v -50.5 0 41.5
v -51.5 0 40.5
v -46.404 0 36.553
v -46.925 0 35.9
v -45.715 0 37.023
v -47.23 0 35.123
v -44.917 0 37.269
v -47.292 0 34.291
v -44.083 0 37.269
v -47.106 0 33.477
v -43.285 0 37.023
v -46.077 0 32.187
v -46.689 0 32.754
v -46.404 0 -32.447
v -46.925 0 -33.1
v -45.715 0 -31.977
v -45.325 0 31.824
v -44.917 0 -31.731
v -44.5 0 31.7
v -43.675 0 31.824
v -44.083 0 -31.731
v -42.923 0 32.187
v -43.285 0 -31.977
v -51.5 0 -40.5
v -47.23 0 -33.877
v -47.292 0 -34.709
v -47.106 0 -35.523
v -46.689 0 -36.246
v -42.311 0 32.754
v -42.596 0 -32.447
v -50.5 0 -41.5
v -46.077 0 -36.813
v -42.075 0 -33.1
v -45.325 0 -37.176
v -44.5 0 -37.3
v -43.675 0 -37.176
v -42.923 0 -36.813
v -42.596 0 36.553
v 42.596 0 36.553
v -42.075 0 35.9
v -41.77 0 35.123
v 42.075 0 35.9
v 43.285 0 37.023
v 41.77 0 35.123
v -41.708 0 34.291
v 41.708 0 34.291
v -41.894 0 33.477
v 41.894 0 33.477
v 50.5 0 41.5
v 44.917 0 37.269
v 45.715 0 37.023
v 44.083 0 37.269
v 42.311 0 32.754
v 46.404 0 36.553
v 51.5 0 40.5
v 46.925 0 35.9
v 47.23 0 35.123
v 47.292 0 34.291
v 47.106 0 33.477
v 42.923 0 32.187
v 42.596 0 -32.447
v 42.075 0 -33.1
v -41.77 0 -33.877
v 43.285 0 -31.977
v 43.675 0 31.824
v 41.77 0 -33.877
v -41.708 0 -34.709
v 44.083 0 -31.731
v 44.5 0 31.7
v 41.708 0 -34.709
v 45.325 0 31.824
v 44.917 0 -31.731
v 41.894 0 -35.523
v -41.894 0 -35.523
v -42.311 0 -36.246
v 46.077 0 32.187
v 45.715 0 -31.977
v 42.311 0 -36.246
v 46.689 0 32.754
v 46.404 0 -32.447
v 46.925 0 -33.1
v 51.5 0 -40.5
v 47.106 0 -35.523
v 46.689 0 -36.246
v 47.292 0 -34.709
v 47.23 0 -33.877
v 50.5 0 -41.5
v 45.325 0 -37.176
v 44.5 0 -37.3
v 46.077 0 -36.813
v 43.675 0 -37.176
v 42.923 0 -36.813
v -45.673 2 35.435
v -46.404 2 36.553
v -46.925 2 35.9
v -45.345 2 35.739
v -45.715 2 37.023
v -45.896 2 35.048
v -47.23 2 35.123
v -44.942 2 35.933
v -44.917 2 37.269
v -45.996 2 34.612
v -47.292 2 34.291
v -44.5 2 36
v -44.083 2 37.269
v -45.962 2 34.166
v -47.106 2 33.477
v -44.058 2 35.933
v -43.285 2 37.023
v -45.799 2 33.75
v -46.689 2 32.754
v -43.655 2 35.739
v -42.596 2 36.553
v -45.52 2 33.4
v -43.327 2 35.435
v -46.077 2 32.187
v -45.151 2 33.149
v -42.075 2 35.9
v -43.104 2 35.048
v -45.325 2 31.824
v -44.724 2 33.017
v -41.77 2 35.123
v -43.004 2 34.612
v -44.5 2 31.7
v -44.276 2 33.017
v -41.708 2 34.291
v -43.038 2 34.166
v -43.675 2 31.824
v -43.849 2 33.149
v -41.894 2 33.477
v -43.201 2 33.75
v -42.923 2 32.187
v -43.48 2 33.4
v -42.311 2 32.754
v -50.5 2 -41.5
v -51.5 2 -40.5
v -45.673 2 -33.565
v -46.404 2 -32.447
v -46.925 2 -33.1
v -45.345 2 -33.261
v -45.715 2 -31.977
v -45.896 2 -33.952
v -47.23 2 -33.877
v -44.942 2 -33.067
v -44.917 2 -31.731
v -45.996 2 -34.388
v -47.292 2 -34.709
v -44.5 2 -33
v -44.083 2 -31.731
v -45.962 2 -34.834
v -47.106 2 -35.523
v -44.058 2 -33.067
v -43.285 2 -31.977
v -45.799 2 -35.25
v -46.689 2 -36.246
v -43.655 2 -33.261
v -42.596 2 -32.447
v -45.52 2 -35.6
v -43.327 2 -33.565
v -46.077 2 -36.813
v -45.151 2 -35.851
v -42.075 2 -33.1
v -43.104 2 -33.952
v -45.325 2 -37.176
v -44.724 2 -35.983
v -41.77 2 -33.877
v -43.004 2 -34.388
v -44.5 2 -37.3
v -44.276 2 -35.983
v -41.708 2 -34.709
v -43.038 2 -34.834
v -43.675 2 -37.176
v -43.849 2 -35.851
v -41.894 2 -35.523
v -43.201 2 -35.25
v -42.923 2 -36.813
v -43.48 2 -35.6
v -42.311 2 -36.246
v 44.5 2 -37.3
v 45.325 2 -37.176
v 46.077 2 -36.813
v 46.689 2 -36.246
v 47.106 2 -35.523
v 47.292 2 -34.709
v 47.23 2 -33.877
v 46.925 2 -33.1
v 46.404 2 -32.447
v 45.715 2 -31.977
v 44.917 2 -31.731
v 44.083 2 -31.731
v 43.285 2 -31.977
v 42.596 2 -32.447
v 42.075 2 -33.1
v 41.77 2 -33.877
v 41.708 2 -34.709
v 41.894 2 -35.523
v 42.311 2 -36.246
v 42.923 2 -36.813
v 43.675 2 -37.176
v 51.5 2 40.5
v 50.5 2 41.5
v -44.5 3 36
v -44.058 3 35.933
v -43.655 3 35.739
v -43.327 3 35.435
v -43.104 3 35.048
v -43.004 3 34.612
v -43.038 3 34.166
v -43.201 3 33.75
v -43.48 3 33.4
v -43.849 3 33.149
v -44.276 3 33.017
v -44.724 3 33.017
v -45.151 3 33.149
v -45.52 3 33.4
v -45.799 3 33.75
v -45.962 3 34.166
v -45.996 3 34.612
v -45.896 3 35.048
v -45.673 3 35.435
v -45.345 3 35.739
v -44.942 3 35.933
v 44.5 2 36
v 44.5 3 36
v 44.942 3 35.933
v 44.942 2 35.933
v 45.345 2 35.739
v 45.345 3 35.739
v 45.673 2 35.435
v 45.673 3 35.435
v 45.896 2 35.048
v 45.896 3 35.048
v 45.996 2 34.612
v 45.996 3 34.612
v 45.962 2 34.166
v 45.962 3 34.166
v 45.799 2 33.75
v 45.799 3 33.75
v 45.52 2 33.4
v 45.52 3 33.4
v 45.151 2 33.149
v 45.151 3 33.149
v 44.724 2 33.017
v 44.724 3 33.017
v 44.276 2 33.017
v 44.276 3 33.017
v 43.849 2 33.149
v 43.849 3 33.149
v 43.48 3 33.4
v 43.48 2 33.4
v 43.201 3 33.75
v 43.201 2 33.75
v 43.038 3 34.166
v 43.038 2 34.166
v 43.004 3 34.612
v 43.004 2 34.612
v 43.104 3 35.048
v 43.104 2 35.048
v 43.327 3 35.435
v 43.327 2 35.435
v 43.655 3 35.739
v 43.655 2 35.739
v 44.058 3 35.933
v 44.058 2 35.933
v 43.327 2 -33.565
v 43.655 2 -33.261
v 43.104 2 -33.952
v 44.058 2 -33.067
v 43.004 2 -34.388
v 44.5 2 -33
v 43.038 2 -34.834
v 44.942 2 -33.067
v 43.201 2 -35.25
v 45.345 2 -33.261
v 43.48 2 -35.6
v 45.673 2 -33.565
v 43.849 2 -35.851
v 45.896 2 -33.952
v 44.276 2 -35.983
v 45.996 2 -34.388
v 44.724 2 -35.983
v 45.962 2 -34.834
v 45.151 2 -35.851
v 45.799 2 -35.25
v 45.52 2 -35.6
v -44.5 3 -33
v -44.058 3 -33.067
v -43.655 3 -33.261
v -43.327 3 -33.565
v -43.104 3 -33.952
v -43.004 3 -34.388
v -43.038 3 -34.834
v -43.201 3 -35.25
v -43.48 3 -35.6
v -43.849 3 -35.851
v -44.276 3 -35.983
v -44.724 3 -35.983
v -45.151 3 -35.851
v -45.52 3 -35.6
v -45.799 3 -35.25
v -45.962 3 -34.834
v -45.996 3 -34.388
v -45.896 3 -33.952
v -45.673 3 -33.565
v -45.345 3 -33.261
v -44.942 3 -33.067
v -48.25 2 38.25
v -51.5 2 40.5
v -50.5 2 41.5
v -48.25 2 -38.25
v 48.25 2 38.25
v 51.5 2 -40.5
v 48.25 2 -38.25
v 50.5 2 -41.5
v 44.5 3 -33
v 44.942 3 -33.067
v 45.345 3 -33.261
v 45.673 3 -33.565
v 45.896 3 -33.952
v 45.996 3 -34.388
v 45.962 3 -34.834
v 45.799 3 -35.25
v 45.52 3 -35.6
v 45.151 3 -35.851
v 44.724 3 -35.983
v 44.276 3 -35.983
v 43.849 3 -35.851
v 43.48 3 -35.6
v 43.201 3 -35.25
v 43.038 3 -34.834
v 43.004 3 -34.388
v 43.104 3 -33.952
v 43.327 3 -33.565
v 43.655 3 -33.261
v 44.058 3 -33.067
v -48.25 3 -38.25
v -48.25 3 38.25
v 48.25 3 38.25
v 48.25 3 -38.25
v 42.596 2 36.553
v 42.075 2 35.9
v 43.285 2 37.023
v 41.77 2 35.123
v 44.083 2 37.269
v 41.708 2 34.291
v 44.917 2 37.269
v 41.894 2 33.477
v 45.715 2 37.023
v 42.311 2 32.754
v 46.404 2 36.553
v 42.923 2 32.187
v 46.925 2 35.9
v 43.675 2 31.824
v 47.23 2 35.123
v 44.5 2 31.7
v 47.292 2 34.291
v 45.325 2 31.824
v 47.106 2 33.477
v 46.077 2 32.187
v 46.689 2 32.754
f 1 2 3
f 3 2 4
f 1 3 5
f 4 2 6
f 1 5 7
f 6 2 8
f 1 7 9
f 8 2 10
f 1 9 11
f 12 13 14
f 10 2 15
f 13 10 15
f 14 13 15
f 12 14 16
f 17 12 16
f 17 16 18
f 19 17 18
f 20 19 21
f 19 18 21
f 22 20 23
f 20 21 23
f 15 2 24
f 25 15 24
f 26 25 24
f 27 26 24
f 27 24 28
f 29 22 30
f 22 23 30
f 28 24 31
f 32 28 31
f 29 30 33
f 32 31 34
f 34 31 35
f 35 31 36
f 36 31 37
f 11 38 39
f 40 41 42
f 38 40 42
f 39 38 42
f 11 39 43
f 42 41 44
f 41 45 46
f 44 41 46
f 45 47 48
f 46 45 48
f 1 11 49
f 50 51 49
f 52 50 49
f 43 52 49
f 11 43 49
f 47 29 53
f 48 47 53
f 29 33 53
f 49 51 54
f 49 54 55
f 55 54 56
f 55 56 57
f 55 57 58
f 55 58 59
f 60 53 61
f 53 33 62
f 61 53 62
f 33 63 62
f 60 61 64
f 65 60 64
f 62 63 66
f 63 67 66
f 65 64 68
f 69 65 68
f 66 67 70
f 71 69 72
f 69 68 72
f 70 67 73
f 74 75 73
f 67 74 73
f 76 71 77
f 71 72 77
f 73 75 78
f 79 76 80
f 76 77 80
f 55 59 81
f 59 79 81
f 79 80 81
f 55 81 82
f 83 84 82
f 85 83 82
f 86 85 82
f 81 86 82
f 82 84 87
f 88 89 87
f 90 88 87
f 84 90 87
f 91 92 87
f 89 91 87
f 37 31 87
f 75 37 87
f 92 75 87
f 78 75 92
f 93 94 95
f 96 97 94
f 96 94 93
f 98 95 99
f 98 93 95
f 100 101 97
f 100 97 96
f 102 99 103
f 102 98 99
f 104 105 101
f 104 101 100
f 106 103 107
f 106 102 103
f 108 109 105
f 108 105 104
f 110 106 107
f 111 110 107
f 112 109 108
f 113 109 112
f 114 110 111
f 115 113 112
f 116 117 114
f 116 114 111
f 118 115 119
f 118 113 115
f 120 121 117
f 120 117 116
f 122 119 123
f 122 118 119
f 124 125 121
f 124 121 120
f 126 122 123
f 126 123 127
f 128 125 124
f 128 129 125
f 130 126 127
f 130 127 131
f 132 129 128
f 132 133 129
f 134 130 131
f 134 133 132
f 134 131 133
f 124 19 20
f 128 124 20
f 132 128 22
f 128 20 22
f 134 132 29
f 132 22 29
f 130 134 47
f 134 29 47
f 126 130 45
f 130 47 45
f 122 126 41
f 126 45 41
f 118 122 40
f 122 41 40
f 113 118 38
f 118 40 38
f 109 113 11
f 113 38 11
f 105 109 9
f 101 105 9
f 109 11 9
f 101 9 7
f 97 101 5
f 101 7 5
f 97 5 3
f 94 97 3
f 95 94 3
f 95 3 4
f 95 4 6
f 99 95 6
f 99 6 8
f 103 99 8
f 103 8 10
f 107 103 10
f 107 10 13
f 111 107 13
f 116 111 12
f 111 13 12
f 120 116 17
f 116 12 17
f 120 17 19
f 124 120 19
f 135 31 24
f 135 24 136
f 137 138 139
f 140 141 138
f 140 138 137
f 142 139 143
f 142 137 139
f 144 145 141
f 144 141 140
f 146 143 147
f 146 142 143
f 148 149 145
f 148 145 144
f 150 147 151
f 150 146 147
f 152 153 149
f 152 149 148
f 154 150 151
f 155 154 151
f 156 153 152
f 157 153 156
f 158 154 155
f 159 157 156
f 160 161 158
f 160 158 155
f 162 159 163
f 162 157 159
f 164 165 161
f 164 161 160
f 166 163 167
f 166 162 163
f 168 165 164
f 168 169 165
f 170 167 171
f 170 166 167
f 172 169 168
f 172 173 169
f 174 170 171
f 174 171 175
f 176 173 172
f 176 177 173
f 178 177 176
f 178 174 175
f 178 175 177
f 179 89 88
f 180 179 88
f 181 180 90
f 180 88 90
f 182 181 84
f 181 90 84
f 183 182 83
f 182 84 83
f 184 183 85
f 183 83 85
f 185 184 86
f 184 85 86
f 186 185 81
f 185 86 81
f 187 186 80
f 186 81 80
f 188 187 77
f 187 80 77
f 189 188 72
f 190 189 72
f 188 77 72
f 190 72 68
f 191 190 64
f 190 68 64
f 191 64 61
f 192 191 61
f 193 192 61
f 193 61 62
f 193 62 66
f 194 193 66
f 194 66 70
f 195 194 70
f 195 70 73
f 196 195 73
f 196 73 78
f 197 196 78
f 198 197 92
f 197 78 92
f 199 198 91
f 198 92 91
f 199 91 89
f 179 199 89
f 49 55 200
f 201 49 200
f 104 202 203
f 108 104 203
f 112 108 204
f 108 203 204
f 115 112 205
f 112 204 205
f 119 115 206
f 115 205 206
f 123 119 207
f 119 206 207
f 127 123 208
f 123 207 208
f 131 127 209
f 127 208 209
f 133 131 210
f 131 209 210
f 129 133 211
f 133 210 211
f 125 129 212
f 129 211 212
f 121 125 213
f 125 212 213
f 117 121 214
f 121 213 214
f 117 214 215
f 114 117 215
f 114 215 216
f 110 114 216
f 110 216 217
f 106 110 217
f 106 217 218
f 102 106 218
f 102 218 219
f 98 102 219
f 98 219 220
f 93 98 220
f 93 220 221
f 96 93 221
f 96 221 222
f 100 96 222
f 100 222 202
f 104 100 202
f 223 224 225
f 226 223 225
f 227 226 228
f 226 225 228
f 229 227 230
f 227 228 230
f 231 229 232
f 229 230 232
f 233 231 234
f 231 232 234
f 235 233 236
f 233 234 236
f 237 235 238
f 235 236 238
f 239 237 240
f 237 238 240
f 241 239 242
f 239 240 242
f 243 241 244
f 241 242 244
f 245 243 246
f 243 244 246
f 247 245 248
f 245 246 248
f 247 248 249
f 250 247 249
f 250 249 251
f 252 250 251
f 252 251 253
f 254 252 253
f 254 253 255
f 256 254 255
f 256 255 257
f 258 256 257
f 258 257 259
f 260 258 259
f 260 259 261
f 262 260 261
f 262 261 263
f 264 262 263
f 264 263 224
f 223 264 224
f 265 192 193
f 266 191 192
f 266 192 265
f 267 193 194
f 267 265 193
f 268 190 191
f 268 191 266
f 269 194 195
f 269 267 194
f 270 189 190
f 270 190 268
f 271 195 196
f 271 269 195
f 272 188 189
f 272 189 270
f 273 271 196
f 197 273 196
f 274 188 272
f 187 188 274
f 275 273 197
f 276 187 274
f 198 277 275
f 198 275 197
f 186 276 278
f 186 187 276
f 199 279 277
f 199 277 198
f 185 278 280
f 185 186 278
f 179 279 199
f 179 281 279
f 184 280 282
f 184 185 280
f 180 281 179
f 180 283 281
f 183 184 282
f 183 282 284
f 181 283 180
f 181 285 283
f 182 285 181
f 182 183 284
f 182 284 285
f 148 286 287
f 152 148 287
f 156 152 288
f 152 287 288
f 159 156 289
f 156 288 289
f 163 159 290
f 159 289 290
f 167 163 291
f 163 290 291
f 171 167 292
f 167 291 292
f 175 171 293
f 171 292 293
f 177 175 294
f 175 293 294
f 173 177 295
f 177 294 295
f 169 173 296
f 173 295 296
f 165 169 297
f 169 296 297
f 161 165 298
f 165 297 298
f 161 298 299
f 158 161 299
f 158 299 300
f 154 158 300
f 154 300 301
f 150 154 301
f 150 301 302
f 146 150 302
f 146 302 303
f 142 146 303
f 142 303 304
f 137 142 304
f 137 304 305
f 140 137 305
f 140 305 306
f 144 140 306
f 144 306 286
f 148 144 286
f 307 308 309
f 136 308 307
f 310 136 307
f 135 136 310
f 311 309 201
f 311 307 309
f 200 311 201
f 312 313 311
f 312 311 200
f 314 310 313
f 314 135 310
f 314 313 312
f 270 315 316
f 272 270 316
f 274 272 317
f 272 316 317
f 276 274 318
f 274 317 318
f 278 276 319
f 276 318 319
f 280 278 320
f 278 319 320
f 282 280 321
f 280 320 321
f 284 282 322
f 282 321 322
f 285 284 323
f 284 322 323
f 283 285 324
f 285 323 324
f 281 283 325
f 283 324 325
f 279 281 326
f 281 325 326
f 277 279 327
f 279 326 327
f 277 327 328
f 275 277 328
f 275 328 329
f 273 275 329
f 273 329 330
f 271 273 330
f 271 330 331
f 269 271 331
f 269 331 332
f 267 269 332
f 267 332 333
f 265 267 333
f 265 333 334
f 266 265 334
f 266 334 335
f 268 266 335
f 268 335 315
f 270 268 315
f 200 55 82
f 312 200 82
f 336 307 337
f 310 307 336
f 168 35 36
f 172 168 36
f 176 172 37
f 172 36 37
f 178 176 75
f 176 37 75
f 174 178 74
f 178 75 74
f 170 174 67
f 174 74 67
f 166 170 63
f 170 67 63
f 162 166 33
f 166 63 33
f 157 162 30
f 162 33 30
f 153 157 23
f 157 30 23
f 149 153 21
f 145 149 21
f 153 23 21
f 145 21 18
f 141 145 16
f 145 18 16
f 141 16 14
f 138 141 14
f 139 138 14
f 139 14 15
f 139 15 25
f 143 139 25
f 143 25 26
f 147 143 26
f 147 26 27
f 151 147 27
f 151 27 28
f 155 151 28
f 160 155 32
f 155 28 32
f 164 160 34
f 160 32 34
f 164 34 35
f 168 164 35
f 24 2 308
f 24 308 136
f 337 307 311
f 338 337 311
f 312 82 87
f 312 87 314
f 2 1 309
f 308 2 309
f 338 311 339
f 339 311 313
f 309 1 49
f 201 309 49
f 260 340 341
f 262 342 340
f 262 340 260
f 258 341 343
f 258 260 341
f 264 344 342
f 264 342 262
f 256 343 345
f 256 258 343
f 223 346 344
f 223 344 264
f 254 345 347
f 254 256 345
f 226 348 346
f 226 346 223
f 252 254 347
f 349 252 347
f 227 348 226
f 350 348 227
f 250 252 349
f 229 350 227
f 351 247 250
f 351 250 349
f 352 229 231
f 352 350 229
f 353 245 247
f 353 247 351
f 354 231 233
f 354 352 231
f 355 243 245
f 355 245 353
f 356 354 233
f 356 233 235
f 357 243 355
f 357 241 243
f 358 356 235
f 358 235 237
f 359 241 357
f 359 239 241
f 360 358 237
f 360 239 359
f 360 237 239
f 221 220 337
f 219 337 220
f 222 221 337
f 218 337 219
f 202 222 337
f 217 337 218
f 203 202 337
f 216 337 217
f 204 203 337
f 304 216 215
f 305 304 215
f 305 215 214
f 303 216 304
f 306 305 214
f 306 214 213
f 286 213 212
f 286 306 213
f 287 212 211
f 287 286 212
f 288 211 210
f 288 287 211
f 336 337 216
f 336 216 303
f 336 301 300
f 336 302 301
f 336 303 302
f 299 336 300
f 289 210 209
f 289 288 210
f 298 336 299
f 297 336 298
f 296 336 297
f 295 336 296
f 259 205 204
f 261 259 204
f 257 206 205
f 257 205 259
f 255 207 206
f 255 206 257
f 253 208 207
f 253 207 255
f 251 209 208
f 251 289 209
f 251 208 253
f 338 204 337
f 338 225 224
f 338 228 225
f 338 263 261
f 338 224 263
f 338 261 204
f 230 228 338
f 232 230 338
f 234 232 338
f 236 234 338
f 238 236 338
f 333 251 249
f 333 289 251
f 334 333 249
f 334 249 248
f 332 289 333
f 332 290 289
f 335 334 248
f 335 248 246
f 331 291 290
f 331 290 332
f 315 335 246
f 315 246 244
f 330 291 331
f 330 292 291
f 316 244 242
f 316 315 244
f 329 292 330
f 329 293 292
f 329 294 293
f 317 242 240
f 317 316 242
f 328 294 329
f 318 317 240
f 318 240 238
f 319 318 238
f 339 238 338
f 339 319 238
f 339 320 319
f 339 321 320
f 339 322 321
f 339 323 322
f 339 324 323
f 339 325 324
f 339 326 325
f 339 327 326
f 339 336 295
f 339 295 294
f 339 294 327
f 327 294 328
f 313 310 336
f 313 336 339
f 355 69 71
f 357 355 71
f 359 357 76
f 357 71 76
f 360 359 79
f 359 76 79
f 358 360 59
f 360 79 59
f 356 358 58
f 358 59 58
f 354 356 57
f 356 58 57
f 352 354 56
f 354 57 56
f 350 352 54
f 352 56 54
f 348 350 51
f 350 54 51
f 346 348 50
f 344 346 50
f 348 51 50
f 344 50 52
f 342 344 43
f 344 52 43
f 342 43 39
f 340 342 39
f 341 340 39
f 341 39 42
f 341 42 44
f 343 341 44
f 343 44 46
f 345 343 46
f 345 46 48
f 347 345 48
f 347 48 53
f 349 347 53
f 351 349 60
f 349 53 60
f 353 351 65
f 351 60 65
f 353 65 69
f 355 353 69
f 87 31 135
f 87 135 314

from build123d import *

# Parameters (mm, degrees)
SKETCH1_W           = 103
SKETCH1_H           = 83
BOSS_EXTRUDE1_DEPTH = 2
SKETCH2_W           = 96.5
SKETCH2_H           = 76.5
BOSS_EXTRUDE2_DEPTH = 1
CHAMFER1_SIZE       = 1
SKETCH3_R           = 1.5
CUT_EXTRUDE1_DEPTH  = 67.208005558
SKETCH5_R           = 2.8
CUT_EXTRUDE2_DEPTH  = 2


with BuildPart() as part:
    # Sketch1 → Boss-Extrude1 (new body)
    with BuildSketch(Plane(origin=(0, 0, 0), x_dir=(1, 0, 0), z_dir=(0, 1, 0))):
        Rectangle(SKETCH1_W, SKETCH1_H)
    extrude(amount=BOSS_EXTRUDE1_DEPTH)

    # Sketch2 → Boss-Extrude2 (add)
    with BuildSketch(Plane(origin=(0, 2, 0), x_dir=(1, 0, 0), z_dir=(0, 1, 0))):
        Rectangle(SKETCH2_W, SKETCH2_H)
    extrude(amount=BOSS_EXTRUDE2_DEPTH)

    # Chamfer1
    chamfer1_edges = [part.edges().sort_by_distance(p)[0] for p in [
        (51.5, 1, 41.5),
        (-51.5, 1, 41.5),
        (-51.5, 1, -41.5),
        (51.5, 1, -41.5),
    ]]
    chamfer(chamfer1_edges, length=CHAMFER1_SIZE)

    # Sketch3 → Cut-Extrude1 (cut, through all)
    with BuildSketch(Plane(origin=(0, 3, 0), x_dir=(1, 0, 0), z_dir=(0, 1, 0))):
        with Locations(Location((-44.5, 34.5, 0), (0, 0, 270))):
            Circle(SKETCH3_R)
        with Locations(Location((44.5, 34.5, 0), (0, 0, 270))):
            Circle(SKETCH3_R)
        with Locations(Location((44.5, -34.5, 0), (0, 0, 270))):
            Circle(SKETCH3_R)
        with Locations(Location((-44.5, -34.5, 0), (0, 0, 270))):
            Circle(SKETCH3_R)
    extrude(amount=-CUT_EXTRUDE1_DEPTH, mode=Mode.SUBTRACT)

    # Sketch5 → Cut-Extrude2 (cut)
    with BuildSketch(Plane.XZ):
        with Locations(Location((-44.5, 34.5, 0), (0, 0, 270))):
            Circle(SKETCH5_R)
        with Locations(Location((44.5, 34.5, 0), (0, 0, 270))):
            Circle(SKETCH5_R)
        with Locations(Location((44.5, -34.5, 0), (0, 0, 270))):
            Circle(SKETCH5_R)
        with Locations(Location((-44.5, -34.5, 0), (0, 0, 270))):
            Circle(SKETCH5_R)
    extrude(amount=-CUT_EXTRUDE2_DEPTH, mode=Mode.SUBTRACT)


solid = part.part
